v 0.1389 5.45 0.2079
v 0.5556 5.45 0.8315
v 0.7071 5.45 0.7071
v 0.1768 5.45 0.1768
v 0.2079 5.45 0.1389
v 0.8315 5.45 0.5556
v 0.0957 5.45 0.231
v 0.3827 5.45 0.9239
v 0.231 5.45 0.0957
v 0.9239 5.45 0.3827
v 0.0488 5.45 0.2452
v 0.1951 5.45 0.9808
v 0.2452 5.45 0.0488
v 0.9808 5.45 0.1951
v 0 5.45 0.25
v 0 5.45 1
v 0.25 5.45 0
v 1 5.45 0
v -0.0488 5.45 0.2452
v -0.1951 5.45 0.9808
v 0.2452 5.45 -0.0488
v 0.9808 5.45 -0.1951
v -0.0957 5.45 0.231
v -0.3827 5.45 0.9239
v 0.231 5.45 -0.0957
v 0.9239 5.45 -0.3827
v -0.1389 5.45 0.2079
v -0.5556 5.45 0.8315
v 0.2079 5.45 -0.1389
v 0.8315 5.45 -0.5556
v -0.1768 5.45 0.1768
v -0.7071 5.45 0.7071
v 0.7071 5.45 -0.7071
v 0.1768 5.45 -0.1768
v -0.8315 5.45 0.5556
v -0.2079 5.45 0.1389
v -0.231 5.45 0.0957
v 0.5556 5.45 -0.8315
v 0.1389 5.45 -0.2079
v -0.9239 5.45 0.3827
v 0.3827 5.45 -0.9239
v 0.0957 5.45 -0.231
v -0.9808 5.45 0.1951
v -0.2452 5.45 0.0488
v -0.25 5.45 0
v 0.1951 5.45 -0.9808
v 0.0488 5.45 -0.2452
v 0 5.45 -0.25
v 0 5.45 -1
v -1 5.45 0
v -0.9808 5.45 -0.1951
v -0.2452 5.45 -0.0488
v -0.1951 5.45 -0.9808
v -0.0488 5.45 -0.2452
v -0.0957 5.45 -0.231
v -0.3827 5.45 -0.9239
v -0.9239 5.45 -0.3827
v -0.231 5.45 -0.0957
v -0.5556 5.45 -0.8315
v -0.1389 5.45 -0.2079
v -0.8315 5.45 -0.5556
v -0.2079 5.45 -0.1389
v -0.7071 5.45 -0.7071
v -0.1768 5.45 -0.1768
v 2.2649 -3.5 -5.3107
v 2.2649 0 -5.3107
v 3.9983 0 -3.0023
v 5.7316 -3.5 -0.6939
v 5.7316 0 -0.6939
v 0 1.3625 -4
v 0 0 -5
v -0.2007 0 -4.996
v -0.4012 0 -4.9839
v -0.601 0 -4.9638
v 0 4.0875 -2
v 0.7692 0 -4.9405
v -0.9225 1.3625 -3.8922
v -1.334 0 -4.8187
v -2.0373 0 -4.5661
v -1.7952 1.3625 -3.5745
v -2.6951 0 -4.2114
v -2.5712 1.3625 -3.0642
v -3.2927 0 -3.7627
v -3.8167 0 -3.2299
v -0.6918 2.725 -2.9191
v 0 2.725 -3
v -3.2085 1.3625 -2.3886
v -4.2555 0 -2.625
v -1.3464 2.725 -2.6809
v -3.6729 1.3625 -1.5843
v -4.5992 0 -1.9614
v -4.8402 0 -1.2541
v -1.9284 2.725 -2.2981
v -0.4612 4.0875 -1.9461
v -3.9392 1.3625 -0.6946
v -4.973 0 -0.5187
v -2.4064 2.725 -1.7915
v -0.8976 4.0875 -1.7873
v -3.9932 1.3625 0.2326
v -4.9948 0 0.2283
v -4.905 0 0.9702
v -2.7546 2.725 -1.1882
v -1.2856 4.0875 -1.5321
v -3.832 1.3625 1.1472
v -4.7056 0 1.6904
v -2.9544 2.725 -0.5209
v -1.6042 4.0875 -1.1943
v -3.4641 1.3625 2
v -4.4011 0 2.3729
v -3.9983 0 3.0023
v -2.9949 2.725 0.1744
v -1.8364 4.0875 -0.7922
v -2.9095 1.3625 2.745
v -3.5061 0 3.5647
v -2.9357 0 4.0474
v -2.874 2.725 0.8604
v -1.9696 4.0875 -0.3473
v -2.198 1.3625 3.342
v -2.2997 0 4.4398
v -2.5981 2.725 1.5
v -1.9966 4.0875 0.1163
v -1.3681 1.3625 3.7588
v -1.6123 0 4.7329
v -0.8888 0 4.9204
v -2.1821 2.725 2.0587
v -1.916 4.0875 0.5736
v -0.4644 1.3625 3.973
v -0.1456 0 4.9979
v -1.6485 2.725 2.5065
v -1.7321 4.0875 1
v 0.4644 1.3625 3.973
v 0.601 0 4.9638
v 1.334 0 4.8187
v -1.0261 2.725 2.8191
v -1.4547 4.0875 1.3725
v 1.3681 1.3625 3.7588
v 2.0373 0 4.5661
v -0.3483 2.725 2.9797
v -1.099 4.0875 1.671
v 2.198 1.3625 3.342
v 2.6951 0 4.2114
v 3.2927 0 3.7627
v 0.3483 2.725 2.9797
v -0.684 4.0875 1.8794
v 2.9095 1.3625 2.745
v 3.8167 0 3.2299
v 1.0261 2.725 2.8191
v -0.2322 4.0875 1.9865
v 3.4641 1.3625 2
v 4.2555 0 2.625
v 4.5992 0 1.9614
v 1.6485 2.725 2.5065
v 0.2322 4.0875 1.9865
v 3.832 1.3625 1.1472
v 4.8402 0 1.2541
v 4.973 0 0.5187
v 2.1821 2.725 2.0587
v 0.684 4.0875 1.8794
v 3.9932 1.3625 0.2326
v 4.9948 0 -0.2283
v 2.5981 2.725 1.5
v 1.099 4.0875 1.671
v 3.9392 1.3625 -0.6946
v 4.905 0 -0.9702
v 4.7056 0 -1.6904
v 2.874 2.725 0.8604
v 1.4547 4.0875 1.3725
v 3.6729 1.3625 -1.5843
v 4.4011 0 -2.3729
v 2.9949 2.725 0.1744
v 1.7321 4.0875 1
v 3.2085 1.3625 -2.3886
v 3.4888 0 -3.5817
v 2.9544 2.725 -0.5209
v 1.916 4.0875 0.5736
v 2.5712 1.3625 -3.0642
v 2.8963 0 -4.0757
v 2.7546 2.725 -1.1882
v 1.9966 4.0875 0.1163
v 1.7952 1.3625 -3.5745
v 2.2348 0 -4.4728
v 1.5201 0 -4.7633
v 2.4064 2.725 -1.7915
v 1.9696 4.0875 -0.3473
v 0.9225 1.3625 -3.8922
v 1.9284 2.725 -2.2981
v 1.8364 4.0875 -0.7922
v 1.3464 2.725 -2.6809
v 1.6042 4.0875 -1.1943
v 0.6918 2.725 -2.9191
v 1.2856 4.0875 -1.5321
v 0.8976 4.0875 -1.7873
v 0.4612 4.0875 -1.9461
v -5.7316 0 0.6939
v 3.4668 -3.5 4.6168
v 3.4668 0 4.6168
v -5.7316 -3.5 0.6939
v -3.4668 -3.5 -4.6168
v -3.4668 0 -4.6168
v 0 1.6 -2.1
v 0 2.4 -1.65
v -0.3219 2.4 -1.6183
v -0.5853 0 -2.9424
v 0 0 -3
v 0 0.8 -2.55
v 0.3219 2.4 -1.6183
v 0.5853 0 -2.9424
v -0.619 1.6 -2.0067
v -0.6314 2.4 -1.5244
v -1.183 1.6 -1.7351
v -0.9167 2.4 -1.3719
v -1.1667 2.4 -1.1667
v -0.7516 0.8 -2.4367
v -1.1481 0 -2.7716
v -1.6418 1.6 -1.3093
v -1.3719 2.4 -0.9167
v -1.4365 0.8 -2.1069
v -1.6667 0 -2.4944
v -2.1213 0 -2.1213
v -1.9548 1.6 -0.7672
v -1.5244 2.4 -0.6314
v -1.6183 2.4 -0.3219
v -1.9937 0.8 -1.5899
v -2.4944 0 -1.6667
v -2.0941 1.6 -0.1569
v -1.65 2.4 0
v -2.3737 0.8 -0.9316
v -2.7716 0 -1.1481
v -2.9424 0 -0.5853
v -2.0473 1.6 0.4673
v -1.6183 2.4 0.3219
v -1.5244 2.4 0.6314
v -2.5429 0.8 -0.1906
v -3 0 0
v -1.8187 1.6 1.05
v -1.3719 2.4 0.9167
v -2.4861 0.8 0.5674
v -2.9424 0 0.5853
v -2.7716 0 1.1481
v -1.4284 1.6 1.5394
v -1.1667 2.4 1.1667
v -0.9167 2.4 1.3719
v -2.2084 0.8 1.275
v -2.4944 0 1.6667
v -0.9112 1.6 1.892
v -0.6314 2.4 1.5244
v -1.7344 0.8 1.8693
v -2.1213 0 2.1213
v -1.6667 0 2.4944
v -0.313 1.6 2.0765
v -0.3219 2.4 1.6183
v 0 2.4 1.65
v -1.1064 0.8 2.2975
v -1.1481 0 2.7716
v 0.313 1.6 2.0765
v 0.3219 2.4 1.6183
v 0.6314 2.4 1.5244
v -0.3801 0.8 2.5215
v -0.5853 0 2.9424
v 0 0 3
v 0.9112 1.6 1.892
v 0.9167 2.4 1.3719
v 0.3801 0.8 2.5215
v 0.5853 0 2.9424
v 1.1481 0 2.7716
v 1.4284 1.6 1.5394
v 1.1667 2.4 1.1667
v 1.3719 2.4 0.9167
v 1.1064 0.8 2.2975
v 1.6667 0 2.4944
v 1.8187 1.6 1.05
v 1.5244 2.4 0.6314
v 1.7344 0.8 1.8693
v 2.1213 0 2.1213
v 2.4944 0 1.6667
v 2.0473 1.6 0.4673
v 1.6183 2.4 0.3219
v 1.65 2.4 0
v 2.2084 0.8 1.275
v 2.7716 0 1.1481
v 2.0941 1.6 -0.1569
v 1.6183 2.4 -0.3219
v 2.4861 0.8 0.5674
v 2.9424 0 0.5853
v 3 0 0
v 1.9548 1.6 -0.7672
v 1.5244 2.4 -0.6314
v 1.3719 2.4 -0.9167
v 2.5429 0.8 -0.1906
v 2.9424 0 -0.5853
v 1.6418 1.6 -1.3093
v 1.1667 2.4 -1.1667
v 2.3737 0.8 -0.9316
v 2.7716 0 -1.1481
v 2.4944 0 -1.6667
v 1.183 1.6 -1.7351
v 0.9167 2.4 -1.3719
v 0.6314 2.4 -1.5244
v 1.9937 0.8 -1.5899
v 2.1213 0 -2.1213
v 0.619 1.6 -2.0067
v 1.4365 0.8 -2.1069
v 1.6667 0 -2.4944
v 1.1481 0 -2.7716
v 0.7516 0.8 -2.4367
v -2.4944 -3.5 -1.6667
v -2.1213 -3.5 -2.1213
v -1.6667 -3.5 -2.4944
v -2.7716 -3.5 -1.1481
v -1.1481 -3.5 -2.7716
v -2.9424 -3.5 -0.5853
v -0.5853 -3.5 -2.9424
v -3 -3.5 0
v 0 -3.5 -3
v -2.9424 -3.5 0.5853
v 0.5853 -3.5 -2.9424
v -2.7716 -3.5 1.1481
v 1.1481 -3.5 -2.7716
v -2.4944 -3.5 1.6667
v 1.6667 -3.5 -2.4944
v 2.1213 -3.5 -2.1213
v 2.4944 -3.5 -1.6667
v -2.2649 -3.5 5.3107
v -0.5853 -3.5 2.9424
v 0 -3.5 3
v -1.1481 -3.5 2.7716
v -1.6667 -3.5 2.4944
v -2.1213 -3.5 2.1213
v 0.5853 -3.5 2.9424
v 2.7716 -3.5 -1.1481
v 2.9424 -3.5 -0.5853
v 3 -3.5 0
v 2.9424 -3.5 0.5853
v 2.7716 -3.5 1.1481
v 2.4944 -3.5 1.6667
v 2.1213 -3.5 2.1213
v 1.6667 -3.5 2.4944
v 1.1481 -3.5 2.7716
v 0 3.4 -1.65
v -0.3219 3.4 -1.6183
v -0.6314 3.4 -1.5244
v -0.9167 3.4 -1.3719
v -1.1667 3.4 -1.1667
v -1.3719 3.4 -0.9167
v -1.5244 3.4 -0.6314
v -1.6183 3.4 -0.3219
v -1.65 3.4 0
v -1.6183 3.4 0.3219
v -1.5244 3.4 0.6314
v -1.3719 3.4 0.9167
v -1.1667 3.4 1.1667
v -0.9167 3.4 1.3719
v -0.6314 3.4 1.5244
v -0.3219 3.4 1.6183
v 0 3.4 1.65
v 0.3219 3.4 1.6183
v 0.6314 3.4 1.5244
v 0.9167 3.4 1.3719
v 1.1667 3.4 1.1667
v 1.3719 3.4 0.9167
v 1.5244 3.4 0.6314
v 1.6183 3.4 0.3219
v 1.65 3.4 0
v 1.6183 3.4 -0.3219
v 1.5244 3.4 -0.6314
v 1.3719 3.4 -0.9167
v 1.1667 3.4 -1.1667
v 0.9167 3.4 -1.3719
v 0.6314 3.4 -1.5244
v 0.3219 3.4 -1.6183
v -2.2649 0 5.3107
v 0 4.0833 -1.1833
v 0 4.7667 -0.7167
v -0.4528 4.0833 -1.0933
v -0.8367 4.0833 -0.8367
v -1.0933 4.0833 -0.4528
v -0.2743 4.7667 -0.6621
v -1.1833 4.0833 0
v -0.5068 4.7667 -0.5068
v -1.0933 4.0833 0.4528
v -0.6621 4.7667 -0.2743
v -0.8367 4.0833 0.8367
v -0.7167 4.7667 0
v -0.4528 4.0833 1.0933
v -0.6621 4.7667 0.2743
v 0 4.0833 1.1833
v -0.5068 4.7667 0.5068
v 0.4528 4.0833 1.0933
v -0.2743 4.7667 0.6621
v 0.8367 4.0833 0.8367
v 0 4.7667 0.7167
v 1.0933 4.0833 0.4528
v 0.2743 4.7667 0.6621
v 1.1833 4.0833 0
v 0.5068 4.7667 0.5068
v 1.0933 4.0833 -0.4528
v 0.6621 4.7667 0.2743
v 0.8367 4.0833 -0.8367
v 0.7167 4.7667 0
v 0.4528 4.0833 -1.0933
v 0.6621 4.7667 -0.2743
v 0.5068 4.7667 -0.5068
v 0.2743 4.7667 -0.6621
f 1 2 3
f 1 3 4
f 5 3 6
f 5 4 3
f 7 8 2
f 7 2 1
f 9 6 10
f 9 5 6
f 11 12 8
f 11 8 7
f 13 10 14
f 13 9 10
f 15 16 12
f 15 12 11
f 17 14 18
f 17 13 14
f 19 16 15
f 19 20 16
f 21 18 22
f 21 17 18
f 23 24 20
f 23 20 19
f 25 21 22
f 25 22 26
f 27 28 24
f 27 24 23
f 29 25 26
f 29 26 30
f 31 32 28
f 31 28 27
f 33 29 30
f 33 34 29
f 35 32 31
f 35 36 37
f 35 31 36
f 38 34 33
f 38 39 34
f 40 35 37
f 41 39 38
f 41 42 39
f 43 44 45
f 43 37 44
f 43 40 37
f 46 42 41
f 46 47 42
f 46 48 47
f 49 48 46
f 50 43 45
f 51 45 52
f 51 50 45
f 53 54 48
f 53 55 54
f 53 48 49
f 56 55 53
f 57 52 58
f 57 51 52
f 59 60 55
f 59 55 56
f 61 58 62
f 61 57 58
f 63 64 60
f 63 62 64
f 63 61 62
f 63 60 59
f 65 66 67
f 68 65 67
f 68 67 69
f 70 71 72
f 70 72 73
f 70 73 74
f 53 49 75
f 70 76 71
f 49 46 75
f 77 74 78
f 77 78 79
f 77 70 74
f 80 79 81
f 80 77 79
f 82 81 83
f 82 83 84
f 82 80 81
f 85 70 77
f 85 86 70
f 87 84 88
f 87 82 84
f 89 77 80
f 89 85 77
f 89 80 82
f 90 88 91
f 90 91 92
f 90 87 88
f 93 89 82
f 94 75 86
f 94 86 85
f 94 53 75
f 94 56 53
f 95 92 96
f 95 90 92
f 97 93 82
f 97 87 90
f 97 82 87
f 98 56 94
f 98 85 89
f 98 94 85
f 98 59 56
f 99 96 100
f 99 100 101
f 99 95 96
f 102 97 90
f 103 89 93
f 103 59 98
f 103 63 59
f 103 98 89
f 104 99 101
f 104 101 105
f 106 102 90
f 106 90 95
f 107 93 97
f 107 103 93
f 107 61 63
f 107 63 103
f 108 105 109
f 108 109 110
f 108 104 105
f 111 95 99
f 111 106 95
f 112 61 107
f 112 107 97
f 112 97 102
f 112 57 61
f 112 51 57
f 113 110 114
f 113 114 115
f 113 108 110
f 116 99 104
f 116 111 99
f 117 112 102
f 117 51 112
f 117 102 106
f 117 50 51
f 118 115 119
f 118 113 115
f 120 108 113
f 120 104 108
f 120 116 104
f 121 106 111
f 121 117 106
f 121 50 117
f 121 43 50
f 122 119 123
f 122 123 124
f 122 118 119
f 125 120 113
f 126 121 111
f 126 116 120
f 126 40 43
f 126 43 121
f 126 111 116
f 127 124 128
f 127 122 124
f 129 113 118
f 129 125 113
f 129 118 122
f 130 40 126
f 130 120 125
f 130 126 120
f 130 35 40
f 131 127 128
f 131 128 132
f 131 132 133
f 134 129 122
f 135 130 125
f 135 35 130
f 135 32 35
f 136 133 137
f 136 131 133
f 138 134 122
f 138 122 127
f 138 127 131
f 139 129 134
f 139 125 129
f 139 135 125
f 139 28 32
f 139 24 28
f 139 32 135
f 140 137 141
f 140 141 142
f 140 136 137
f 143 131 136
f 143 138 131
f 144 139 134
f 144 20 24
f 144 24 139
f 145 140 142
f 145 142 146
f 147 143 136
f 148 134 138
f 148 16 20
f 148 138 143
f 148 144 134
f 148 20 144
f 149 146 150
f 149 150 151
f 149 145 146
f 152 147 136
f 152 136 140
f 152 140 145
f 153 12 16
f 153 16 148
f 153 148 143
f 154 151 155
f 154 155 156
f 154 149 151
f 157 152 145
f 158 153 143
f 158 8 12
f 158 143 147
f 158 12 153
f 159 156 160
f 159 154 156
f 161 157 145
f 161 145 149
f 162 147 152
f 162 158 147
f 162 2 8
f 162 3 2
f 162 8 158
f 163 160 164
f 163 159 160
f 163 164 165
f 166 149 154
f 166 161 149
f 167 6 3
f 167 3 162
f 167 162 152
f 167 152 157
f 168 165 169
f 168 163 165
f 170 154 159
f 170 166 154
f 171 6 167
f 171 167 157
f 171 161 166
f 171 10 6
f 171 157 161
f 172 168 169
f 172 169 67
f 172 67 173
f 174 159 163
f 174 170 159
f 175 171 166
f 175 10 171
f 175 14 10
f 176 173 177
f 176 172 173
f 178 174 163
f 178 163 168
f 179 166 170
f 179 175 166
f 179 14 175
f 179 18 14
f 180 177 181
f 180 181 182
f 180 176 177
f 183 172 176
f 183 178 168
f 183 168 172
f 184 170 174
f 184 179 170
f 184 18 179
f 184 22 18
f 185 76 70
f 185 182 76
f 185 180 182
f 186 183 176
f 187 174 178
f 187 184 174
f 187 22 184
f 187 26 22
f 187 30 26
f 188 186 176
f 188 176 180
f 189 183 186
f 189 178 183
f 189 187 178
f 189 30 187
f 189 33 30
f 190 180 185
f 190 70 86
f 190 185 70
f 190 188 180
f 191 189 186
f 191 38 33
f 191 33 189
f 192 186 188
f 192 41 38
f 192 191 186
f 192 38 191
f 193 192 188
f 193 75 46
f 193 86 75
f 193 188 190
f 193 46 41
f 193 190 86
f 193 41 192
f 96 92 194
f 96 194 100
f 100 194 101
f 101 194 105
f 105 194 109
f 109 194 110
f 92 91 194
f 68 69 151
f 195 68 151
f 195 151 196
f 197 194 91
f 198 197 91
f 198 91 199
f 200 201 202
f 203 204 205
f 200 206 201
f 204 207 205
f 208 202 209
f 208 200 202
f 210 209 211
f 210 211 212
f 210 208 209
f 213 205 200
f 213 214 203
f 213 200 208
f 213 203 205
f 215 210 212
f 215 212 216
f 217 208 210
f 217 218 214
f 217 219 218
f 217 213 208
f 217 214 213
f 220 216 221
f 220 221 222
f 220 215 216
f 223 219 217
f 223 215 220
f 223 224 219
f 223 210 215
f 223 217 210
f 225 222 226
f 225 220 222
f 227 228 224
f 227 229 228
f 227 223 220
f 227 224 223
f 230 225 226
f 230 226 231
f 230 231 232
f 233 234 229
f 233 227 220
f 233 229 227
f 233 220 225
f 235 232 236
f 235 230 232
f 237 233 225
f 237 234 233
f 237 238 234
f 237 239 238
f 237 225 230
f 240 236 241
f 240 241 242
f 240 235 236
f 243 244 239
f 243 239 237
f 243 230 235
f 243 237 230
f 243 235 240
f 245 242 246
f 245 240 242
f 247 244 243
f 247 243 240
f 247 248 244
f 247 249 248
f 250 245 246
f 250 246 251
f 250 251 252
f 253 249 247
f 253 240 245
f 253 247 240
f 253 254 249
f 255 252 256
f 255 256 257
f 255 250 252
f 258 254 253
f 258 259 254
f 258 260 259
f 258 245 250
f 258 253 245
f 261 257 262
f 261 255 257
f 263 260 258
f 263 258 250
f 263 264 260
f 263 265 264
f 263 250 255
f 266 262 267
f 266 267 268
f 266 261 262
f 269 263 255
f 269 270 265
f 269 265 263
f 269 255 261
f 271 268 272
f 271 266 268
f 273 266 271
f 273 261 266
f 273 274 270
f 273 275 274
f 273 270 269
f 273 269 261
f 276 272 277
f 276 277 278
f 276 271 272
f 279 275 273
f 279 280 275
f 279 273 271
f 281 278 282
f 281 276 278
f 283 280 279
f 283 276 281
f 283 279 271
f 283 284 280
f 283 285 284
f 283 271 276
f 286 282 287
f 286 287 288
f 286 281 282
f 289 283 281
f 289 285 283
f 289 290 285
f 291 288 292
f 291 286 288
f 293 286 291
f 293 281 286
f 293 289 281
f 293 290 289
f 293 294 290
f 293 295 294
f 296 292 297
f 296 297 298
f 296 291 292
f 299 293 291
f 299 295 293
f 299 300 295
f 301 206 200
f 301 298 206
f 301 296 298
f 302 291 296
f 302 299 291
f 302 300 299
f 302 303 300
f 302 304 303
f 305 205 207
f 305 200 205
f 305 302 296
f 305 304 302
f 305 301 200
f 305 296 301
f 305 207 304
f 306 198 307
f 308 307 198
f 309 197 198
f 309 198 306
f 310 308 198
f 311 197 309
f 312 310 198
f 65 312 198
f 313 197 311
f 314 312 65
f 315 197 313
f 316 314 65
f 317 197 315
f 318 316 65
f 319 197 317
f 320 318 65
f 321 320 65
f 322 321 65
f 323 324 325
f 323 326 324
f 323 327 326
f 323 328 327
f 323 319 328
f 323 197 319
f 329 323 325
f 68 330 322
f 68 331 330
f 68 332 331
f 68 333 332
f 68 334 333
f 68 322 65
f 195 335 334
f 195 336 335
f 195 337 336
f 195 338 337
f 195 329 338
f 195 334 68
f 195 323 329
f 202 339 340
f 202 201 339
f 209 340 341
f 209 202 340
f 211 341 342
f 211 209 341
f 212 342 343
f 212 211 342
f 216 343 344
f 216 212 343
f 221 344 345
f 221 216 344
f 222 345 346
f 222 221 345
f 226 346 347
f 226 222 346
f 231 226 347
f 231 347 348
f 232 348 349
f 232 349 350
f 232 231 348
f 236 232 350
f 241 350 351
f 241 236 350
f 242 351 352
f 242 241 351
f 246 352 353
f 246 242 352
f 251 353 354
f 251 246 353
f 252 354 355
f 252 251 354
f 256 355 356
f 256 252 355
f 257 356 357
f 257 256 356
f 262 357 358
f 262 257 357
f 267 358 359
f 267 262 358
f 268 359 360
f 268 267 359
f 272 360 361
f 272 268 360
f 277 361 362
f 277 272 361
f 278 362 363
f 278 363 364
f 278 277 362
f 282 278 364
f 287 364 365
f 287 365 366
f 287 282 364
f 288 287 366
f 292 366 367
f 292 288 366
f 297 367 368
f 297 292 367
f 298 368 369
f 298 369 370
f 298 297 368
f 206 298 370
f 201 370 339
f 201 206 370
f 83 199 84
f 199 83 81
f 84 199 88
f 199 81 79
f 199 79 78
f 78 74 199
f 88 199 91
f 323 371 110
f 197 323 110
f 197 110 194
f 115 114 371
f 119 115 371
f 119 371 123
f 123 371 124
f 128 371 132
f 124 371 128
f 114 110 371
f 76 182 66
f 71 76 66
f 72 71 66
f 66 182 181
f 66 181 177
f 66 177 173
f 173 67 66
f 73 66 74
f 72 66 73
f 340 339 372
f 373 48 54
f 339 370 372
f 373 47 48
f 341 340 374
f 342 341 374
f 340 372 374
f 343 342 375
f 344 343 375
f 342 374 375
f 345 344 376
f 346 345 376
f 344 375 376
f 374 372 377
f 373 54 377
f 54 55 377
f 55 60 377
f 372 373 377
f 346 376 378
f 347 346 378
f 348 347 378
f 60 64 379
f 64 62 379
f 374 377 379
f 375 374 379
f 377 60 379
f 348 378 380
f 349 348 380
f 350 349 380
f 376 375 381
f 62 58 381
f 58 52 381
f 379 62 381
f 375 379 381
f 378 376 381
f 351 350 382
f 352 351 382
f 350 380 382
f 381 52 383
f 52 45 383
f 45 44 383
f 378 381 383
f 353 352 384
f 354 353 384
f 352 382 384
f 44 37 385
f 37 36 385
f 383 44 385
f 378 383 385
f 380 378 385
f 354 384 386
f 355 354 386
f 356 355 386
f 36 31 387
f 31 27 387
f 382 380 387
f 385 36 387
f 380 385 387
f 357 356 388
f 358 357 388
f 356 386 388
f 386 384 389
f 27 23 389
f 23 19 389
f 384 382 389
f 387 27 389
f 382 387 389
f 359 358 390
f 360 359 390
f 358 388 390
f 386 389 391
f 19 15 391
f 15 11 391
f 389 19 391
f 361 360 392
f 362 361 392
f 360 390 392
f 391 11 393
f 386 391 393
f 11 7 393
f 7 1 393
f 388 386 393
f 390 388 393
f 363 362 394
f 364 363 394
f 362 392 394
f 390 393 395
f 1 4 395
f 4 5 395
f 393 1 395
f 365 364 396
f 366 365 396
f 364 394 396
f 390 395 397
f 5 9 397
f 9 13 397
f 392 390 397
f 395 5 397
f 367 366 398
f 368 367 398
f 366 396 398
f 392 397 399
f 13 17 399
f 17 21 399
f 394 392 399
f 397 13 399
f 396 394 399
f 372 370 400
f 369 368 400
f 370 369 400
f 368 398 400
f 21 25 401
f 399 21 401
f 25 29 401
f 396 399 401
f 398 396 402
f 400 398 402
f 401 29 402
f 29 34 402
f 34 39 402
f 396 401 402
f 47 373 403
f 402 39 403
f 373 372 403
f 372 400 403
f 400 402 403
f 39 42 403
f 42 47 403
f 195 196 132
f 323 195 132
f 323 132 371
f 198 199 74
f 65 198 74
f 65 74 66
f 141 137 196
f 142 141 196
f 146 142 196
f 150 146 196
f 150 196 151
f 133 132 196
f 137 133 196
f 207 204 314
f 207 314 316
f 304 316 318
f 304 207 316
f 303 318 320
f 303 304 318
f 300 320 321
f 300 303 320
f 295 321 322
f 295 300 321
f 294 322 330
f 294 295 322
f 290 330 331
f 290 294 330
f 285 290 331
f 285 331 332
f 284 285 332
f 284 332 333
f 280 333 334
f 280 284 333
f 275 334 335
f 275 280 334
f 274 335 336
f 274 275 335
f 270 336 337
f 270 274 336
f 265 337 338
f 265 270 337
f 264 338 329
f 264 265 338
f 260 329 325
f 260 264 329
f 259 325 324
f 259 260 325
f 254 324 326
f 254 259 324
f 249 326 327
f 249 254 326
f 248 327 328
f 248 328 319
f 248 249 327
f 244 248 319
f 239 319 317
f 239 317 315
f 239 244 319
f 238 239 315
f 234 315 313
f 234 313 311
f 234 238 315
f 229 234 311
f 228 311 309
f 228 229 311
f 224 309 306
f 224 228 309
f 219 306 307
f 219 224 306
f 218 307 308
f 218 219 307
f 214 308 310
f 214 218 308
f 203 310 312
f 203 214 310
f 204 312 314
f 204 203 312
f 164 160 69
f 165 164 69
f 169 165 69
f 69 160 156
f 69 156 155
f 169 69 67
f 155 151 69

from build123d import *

# Parameters (mm, degrees)
SKETCH10_R          = 3
BOSS_EXTRUDE2_DEPTH = 3.5


with BuildPart() as part:
    # Sketch1 → Revolve1 (revolve)
    with BuildSketch(Plane.XY, mode=Mode.PRIVATE) as revolve1_sk:
        Polygon((0, 0), (5, 0), (1, 5.45), (0, 5.45), align=None)
    revolve(revolve1_sk.sketch.rotate(Axis((0, -3.7, 0), (0, 1, 0)), 90), axis=Axis((0, -3.7, 0), (0, 1, 0)))

    # Sketch3 → Cut-Revolve1 (revolve, cut)
    with BuildSketch(Plane.XY, mode=Mode.PRIVATE) as cut_revolve1_sk:
        Polygon((-1.65, 3.4), (-1.65, 2.4), (-3, 0), (0, 0), (0, 3.4), align=None)
        Polygon((-0.25, 5.45), (0, 5.45), (0, 3.4), (-1.65, 3.4), align=None)
    revolve(cut_revolve1_sk.sketch.rotate(Axis((0, 0, 0), (0, 1, 0)), 270), axis=Axis((0, 0, 0), (0, 1, 0)), mode=Mode.SUBTRACT)

    # Sketch10 → Boss-Extrude2 (add)
    with BuildSketch(Plane.XZ):
        Polygon((5.731649919, -0.693918255), (3.466775796, 4.616795308), (-2.264874122, 5.310713562), (-5.731649919, 0.693918255), (-3.466775796, -4.616795308), (2.264874122, -5.310713562), align=None)
        with Locations(Location((0, 0, 0), (0, 0, 270))):
            Circle(SKETCH10_R, mode=Mode.SUBTRACT)
    extrude(amount=BOSS_EXTRUDE2_DEPTH)


solid = part.part
